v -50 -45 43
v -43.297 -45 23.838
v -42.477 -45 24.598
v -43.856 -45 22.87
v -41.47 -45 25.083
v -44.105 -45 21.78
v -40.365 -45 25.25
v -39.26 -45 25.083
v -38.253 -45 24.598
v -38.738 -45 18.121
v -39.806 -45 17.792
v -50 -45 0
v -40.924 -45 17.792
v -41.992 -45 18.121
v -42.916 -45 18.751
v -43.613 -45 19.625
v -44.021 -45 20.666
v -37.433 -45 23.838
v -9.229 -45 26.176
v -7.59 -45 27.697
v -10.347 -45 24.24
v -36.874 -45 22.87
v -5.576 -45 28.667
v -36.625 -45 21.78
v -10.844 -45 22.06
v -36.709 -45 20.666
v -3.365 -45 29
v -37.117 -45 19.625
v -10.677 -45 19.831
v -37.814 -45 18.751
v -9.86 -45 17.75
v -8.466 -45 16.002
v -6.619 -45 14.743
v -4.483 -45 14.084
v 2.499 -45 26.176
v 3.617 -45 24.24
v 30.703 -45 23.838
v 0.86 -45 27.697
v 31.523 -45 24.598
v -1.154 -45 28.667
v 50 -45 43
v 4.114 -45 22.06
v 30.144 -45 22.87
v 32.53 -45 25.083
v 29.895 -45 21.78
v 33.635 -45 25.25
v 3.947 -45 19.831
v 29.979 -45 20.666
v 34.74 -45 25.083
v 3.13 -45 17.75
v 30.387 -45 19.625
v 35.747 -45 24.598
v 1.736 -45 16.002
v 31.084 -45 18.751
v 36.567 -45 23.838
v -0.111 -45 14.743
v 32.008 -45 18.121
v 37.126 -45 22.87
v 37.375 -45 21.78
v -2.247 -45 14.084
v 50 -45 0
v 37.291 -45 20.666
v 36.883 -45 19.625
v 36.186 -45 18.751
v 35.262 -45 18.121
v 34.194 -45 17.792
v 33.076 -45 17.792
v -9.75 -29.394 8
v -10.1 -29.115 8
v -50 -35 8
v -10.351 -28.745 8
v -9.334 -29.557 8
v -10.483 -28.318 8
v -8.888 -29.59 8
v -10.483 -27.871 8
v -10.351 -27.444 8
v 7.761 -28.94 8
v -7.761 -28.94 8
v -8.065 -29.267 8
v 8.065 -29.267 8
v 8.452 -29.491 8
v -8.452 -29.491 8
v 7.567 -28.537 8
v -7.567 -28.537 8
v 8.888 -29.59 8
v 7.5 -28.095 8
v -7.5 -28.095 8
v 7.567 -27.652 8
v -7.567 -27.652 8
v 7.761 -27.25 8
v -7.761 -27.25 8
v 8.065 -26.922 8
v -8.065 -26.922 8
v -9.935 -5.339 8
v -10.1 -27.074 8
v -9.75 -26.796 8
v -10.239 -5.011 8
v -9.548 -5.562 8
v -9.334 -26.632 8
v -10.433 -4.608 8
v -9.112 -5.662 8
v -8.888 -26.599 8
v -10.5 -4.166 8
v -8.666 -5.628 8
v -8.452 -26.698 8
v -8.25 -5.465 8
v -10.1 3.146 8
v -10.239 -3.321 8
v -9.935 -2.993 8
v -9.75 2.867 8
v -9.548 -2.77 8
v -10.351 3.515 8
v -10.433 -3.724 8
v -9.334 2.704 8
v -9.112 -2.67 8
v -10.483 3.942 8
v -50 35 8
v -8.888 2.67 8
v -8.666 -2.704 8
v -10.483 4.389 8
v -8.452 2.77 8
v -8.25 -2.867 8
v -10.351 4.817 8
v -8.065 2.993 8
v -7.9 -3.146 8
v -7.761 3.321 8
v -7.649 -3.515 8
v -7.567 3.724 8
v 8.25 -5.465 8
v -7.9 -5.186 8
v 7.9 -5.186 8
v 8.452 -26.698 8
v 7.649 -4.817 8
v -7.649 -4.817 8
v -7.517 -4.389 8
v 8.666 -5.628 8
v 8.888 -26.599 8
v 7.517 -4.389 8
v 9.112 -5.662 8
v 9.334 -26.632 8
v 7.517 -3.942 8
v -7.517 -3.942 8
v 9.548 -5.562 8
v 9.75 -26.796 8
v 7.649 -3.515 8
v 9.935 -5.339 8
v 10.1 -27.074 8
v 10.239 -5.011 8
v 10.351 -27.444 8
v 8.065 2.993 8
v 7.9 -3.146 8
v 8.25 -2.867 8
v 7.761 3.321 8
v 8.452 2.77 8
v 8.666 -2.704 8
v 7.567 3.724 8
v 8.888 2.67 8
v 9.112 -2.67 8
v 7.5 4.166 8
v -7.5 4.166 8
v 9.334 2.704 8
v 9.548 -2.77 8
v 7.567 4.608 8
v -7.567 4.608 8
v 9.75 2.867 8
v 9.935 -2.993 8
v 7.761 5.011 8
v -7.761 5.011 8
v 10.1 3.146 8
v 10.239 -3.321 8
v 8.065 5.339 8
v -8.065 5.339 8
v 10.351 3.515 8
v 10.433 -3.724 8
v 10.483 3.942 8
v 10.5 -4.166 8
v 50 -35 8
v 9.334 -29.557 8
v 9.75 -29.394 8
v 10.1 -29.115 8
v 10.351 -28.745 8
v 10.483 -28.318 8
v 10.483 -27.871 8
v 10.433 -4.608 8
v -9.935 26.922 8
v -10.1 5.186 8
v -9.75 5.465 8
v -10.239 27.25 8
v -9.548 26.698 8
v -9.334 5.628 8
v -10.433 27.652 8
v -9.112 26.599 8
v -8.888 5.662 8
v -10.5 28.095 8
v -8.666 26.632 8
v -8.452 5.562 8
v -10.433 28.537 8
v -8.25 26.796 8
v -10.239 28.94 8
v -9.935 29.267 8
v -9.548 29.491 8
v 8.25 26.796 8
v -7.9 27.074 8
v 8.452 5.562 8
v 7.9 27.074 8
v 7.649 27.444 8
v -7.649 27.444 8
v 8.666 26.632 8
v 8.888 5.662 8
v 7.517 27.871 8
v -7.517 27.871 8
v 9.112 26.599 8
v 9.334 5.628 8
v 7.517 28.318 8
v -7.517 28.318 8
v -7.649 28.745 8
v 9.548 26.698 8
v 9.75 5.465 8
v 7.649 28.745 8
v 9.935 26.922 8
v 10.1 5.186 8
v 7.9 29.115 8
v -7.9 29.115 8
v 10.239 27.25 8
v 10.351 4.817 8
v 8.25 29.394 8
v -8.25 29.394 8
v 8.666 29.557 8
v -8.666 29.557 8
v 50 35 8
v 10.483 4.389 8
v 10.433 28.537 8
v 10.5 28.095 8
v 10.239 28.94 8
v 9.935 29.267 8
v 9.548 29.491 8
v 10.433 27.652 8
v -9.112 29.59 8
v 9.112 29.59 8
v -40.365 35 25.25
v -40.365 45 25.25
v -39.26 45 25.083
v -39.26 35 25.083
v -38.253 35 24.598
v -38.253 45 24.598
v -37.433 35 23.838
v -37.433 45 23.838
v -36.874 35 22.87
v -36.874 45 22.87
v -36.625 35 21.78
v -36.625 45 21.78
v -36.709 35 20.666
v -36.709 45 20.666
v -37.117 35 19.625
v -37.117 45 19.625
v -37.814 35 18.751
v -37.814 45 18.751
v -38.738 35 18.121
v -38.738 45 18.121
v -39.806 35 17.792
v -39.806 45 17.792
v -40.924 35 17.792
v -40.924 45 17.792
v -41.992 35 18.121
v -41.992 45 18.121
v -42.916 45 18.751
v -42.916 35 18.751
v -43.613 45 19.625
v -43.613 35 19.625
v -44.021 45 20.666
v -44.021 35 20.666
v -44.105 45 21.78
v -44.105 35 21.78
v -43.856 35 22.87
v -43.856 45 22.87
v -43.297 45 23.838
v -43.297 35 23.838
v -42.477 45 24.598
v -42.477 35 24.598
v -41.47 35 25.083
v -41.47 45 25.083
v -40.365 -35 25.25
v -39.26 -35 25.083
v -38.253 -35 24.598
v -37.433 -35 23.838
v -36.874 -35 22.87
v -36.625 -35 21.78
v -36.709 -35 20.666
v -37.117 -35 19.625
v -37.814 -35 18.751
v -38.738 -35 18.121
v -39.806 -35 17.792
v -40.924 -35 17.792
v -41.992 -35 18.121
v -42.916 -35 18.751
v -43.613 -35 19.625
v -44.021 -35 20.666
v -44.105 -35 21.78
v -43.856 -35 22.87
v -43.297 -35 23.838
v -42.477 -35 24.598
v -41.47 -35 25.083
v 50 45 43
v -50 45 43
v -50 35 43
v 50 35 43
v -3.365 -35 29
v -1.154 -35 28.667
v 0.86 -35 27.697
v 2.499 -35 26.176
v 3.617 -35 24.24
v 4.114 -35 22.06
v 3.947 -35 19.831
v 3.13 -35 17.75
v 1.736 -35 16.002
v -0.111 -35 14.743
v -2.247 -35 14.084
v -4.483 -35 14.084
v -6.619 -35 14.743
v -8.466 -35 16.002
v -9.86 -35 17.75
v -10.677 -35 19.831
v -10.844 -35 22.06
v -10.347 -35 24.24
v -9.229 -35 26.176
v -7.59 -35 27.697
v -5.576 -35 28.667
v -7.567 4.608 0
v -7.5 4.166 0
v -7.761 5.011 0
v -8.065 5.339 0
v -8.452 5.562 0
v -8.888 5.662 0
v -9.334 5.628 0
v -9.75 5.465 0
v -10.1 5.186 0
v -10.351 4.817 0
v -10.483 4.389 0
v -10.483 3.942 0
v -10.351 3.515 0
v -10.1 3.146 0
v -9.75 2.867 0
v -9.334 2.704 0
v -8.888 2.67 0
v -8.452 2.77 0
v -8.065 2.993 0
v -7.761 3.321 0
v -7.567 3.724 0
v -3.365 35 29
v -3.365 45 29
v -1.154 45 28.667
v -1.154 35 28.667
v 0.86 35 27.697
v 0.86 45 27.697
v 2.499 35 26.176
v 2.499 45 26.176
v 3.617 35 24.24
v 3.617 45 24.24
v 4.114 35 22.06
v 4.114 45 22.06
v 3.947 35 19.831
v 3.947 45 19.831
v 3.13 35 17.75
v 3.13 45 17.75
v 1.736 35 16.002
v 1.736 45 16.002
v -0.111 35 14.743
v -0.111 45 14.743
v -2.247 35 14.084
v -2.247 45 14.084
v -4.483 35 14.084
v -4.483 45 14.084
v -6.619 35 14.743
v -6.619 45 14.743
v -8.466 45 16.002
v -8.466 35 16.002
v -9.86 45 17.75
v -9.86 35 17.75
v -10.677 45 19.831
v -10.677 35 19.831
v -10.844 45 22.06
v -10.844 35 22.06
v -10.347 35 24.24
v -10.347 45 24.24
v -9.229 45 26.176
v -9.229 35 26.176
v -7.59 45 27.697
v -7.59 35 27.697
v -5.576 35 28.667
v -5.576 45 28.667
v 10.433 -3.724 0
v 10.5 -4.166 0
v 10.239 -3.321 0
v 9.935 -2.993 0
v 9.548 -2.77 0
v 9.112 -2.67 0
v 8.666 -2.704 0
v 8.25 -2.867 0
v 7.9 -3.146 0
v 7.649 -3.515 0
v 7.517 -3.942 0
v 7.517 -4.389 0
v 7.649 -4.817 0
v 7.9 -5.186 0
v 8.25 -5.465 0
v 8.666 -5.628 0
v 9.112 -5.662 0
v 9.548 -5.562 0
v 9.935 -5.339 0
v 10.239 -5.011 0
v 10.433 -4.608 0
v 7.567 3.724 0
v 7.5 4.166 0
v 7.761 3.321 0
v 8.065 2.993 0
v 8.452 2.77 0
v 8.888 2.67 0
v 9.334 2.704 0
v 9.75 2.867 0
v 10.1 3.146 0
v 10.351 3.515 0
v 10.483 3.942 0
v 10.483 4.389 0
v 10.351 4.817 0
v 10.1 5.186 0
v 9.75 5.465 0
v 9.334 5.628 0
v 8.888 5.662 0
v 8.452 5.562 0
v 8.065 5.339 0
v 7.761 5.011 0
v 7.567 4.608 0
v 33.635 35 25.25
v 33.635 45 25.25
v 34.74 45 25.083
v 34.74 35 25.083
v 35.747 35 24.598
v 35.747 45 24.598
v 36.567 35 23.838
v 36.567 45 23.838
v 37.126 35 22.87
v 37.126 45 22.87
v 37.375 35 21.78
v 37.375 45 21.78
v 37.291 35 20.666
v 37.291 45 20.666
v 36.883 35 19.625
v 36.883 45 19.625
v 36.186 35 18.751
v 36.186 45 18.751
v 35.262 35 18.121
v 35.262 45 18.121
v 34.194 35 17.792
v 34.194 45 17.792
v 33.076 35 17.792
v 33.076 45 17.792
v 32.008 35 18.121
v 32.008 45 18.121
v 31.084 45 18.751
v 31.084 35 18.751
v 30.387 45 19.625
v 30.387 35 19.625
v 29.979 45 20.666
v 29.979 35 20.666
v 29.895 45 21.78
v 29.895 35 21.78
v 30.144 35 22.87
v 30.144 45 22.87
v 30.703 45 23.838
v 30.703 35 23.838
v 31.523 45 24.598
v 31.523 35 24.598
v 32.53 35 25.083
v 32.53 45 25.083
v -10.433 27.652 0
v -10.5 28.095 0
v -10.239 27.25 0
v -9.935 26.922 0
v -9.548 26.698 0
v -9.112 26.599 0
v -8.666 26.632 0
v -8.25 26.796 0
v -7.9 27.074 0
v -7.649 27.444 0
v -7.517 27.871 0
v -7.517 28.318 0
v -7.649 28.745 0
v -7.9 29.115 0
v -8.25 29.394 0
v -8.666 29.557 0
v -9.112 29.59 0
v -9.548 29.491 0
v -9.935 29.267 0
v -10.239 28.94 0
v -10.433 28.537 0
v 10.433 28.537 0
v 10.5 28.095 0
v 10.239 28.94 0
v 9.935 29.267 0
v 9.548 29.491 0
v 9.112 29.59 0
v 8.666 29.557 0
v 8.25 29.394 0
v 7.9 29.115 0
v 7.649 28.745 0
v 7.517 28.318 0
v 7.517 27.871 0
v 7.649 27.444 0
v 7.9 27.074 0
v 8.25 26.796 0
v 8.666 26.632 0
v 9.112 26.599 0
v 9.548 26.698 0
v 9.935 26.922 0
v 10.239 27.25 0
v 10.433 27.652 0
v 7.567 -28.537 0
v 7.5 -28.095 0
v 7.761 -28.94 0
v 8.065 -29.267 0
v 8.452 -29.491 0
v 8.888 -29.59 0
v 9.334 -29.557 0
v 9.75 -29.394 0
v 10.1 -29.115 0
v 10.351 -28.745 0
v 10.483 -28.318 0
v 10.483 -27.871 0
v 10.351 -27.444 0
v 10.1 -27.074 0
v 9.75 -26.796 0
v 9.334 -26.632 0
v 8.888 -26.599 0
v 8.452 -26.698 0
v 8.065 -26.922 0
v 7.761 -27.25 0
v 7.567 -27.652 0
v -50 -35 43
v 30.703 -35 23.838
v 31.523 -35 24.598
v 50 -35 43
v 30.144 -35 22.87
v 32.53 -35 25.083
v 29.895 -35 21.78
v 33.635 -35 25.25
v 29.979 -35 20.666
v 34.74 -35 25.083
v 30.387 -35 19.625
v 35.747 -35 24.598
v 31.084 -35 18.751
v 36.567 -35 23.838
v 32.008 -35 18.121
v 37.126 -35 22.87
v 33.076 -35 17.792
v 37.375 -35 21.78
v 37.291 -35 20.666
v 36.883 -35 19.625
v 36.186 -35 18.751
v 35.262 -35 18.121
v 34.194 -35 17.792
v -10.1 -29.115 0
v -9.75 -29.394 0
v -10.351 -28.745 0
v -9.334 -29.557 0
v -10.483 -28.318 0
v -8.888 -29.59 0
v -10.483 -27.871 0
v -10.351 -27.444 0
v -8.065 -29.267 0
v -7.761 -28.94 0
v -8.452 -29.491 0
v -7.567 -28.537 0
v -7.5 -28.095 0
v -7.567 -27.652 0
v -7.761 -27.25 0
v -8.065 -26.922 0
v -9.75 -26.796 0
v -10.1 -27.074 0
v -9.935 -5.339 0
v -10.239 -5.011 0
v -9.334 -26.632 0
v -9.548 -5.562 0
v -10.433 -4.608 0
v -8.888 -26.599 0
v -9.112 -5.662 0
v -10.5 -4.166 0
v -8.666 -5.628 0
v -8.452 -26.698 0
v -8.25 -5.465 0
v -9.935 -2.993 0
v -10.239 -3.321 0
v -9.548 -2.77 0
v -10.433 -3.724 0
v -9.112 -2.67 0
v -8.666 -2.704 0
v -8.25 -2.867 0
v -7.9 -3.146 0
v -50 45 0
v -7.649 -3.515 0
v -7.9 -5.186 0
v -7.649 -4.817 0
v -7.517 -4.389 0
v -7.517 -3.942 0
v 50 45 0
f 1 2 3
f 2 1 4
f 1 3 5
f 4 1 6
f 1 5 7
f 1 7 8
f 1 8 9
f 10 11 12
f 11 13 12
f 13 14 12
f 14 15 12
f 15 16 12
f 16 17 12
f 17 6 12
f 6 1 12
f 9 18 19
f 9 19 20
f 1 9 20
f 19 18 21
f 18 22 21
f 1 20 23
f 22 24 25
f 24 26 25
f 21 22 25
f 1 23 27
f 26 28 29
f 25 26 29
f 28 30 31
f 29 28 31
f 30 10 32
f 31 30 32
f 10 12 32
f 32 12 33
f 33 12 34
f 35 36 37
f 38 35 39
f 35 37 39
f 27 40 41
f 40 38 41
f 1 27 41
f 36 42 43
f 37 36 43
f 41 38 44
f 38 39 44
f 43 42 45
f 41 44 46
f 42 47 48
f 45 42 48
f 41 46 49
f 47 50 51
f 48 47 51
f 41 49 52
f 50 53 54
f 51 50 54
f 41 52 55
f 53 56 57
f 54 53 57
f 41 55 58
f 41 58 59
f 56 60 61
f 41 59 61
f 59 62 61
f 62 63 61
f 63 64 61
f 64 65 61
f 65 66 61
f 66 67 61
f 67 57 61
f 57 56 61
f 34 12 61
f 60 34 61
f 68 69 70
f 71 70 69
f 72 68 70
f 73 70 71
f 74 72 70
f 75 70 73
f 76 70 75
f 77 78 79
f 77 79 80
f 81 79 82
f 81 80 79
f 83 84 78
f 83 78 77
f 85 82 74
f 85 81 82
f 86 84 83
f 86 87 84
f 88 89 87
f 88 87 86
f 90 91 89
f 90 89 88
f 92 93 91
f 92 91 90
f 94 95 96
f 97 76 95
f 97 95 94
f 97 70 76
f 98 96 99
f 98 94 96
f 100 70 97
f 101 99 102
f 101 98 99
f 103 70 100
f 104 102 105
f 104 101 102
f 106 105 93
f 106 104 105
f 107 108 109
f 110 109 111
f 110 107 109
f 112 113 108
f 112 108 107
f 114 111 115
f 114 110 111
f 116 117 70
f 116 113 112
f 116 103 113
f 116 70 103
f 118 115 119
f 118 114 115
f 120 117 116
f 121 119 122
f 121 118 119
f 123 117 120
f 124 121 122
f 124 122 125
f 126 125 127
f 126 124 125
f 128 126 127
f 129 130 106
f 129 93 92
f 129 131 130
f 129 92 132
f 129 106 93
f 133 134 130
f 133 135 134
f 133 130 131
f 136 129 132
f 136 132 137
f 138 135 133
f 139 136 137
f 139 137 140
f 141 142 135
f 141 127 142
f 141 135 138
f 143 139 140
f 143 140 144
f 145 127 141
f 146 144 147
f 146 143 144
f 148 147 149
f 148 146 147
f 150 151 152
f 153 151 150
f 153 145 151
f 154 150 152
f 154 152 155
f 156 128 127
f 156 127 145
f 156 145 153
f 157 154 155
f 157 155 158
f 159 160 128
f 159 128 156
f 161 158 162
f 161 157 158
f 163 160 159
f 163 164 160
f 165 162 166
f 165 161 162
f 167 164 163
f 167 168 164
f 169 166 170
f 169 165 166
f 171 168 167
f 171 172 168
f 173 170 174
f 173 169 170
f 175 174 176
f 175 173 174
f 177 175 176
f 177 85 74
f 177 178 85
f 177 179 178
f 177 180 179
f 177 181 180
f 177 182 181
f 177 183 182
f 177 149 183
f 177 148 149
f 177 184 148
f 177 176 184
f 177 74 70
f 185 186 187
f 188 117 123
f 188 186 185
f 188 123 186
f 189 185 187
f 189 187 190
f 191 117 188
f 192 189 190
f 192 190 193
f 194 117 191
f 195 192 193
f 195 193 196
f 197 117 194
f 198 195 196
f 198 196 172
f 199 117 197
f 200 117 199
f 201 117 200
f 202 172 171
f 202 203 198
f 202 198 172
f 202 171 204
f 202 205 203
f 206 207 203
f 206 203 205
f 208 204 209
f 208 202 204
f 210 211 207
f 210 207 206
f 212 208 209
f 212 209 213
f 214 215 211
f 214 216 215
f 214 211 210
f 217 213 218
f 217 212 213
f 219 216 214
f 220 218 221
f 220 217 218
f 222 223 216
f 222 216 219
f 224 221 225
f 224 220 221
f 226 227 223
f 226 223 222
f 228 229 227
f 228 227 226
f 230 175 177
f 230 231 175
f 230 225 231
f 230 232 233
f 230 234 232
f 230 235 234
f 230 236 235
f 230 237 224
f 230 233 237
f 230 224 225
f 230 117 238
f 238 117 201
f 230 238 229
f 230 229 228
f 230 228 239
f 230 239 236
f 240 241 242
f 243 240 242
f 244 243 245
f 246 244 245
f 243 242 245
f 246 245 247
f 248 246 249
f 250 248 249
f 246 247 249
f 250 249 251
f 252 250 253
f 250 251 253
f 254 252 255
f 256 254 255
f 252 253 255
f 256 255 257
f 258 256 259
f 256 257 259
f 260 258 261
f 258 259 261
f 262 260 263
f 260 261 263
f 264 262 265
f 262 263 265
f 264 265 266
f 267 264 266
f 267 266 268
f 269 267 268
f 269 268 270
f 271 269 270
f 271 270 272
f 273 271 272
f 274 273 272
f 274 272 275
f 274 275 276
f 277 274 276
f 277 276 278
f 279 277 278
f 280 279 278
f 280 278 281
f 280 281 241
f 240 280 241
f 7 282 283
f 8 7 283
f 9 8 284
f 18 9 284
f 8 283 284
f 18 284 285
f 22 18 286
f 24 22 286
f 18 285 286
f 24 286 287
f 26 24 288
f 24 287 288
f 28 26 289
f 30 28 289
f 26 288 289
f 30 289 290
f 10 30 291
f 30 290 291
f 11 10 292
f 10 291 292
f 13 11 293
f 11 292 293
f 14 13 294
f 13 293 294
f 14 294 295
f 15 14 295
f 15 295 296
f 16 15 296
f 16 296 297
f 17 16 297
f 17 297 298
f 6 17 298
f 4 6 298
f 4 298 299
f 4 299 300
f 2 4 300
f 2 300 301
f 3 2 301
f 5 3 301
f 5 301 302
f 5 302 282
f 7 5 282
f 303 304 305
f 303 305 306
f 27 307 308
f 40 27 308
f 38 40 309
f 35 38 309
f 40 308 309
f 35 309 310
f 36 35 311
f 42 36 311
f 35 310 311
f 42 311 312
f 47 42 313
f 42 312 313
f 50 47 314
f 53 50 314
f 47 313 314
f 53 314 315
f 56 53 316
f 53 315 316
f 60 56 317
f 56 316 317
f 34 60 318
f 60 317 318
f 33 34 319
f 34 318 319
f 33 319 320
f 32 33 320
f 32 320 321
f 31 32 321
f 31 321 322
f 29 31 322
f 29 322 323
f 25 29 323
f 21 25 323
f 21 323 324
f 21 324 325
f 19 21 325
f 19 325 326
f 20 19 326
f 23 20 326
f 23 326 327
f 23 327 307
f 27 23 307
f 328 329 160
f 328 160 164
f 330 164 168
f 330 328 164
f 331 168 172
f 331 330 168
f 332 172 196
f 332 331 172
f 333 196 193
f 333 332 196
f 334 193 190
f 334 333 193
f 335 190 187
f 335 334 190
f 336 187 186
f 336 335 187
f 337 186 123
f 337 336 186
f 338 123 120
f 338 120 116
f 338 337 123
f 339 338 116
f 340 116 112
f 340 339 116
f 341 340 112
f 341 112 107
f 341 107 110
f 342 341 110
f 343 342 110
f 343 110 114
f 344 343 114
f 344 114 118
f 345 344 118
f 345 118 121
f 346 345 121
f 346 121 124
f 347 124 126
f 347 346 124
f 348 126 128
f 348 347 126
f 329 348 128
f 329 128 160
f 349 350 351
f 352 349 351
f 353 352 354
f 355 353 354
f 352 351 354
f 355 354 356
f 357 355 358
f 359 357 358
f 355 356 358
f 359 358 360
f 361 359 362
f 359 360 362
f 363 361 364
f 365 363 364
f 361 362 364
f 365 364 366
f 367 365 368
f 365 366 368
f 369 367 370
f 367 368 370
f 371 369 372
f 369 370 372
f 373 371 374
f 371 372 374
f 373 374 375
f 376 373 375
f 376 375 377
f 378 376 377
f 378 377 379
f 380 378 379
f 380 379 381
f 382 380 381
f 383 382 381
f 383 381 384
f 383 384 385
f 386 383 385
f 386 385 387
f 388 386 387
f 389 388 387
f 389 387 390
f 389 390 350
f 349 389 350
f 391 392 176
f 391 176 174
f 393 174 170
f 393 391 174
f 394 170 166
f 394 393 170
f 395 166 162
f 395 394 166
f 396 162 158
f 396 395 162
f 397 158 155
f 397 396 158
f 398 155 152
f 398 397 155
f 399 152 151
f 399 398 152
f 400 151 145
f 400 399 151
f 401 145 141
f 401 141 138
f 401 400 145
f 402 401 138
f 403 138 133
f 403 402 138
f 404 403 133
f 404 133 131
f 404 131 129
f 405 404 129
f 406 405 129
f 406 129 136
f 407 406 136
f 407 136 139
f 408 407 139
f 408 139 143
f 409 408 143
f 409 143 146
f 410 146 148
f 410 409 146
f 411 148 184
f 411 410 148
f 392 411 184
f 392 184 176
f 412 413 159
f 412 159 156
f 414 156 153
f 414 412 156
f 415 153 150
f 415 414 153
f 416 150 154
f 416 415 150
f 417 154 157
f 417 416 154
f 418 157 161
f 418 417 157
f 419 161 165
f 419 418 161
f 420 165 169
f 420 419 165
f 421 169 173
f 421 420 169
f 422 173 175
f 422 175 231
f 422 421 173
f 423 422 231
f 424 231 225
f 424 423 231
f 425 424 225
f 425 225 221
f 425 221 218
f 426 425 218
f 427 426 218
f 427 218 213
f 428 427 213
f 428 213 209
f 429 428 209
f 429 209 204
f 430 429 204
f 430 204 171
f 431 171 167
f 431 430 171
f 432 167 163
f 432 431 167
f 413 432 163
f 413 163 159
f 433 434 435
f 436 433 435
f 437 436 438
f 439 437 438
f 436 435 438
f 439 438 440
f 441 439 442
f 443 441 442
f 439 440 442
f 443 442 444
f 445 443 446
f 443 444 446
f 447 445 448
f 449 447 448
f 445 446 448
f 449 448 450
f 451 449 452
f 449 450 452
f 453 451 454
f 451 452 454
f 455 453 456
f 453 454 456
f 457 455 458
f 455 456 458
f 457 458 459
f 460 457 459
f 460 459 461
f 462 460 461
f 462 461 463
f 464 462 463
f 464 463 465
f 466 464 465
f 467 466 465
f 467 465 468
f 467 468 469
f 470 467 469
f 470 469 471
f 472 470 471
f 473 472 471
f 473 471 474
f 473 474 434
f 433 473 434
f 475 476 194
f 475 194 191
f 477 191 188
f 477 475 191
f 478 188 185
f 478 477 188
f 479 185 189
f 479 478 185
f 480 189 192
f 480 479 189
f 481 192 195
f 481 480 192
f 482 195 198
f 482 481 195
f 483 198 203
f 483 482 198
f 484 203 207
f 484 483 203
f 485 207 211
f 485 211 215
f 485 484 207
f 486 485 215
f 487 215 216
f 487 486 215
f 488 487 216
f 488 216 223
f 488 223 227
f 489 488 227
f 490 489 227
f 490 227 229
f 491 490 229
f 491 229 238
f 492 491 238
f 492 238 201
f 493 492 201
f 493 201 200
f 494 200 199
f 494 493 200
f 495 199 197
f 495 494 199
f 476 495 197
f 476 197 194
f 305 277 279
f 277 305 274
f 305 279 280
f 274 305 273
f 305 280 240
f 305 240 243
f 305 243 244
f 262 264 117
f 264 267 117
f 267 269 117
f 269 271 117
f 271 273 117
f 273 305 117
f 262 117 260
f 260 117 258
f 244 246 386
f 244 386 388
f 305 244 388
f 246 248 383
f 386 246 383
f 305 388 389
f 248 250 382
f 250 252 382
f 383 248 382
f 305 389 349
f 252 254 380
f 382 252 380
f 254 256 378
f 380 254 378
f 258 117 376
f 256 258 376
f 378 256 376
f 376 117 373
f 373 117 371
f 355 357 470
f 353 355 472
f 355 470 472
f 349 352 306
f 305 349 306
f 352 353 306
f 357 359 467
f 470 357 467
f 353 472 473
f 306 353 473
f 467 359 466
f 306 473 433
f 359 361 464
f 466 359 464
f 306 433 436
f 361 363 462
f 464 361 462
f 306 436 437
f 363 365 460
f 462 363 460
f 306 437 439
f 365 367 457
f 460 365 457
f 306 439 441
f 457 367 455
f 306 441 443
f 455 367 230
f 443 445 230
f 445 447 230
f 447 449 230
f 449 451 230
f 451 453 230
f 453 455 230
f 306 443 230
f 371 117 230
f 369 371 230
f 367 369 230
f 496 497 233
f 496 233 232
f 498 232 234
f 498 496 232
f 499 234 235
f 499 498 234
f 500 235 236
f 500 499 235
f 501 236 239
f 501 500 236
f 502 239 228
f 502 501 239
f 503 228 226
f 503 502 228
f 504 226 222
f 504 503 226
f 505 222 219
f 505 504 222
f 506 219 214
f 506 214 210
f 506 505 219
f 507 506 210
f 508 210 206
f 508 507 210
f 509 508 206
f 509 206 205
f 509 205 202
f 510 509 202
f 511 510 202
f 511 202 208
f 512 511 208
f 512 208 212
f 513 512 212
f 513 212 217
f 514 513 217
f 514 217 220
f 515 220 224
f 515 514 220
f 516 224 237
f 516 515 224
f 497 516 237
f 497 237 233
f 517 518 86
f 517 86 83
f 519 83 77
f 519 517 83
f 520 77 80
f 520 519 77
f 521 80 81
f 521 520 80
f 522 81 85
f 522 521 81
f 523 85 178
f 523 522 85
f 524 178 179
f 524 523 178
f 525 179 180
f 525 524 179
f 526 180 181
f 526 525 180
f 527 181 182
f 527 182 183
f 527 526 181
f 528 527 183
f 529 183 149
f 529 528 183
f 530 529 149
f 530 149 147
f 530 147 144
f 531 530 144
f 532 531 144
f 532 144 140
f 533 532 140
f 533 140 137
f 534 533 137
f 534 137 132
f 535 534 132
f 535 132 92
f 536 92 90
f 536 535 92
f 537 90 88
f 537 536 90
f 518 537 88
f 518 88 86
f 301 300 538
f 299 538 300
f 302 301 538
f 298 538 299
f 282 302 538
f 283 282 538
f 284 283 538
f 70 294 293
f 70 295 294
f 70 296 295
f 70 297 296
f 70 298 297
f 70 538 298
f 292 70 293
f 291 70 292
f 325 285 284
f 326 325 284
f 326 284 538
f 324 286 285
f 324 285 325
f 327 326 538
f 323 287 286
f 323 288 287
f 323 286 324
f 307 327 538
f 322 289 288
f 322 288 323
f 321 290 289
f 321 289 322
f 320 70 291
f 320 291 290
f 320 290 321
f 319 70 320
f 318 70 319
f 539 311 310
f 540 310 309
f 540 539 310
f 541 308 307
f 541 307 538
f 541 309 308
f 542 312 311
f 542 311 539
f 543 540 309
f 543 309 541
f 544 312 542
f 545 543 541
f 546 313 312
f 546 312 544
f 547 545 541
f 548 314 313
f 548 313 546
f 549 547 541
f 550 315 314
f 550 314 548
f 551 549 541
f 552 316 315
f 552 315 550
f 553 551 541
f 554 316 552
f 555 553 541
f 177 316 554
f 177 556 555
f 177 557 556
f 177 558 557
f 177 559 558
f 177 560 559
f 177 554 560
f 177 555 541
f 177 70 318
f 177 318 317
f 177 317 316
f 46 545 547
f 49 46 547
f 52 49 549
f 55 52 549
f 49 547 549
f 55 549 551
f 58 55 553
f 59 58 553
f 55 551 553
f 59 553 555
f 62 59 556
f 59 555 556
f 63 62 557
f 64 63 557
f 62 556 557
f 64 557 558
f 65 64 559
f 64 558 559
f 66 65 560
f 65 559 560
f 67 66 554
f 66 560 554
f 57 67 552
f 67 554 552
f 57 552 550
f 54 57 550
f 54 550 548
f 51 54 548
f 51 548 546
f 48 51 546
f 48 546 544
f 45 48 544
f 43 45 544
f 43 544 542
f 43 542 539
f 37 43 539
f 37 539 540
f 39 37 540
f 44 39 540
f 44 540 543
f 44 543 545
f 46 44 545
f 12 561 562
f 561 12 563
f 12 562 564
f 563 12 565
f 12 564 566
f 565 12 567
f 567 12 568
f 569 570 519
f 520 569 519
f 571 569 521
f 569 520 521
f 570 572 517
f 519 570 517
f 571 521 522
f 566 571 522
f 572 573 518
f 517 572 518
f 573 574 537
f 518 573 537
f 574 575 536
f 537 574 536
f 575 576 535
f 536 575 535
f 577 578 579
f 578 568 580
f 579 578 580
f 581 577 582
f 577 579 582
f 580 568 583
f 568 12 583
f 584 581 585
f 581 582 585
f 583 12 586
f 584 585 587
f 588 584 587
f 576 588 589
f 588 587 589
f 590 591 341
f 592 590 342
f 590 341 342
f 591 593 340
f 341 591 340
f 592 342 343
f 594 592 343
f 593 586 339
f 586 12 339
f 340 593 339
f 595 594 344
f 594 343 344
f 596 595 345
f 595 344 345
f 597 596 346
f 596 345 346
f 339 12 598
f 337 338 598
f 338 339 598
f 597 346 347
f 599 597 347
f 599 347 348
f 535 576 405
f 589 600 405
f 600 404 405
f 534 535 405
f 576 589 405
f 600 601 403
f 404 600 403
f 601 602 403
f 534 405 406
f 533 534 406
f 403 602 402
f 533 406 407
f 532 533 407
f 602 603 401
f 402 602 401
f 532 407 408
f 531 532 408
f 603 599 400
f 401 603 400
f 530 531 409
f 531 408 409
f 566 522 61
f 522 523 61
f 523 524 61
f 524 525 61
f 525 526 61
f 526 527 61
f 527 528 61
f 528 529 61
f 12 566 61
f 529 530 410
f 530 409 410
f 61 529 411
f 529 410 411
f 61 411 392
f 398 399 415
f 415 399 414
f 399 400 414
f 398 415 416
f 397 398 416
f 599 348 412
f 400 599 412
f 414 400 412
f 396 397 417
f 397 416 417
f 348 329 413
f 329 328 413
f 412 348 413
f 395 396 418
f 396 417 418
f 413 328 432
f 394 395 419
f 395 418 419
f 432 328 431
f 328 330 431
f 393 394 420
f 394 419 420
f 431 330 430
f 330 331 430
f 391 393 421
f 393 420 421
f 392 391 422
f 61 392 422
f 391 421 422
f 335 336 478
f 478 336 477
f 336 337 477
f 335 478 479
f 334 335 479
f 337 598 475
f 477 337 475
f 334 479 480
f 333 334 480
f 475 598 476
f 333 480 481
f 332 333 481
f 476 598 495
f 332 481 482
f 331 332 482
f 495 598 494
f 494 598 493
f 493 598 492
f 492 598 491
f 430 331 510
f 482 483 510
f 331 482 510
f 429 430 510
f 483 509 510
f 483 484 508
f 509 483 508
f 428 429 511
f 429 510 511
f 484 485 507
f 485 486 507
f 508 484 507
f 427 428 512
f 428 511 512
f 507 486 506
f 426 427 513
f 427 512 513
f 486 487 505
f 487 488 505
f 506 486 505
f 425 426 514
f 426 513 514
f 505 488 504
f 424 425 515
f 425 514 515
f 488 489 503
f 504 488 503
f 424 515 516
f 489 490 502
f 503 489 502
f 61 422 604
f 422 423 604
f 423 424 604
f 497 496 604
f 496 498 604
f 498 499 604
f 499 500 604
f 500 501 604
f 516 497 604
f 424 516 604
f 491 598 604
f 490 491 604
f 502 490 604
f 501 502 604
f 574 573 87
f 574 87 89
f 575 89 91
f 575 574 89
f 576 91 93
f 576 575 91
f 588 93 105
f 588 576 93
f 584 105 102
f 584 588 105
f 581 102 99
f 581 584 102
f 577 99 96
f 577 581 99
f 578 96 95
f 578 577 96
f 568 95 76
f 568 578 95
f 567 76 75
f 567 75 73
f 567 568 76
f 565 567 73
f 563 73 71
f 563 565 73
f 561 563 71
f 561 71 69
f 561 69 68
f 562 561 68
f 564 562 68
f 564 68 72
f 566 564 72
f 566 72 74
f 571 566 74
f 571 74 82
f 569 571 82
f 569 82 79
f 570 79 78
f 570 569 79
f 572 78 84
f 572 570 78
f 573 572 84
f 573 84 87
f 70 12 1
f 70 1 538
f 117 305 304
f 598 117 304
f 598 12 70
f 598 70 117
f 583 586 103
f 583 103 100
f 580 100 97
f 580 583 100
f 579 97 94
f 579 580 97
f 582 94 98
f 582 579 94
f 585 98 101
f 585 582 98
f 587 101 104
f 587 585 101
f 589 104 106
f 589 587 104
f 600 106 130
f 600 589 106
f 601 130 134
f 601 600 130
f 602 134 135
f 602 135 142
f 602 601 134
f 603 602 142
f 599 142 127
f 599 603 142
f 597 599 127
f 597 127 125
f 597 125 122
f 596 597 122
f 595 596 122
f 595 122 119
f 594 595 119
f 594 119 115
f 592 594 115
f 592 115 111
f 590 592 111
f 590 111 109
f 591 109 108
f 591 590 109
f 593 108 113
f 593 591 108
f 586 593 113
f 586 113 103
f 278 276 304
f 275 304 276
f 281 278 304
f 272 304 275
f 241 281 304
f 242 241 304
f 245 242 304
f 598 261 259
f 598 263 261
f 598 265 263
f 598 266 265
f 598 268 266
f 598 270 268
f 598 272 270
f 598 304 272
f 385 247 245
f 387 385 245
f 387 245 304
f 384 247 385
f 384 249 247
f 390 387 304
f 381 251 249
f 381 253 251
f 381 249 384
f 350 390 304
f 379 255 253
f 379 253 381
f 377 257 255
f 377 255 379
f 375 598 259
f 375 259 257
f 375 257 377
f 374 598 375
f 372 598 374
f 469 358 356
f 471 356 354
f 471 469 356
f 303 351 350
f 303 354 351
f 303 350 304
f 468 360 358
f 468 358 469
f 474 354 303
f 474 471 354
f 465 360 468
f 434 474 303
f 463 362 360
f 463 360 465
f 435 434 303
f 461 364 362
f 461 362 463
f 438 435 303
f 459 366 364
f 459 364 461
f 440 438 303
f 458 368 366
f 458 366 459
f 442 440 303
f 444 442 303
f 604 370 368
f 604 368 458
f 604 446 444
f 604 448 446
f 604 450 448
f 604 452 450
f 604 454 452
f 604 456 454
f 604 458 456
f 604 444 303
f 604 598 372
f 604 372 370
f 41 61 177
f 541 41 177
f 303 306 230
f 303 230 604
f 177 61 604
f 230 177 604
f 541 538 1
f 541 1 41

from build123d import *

# Parameters (mm, degrees)
SKETCH2_W           = 100
SKETCH2_H           = 90
SKETCH2_R           = 1.5
BOSS_EXTRUDE1_DEPTH = 8
SKETCH5_W           = 100
SKETCH5_H           = 10
BOSS_EXTRUDE2_DEPTH = 35
SKETCH7_R           = 7.5
SKETCH7_R_2         = 3.75
CUT_EXTRUDE2_DEPTH  = 290


with BuildPart() as part:
    # Sketch2 → Boss-Extrude1 (new body)
    with BuildSketch(Plane.XY):
        Rectangle(SKETCH2_W, SKETCH2_H)
        with Locations(Location((-9, -4.165902831, 0), (0, 0, 180))):
            Circle(SKETCH2_R, mode=Mode.SUBTRACT)
        with Locations(Location((9, -28.094631071, 0), (0, 0, 180))):
            Circle(SKETCH2_R, mode=Mode.SUBTRACT)
        with Locations((9, -4.165902831)):
            Circle(SKETCH2_R, mode=Mode.SUBTRACT)
        with Locations((-9, -28.094631071)):
            Circle(SKETCH2_R, mode=Mode.SUBTRACT)
        with Locations(Location((-9, 28.094631071, 0), (0, 0, 180))):
            Circle(SKETCH2_R, mode=Mode.SUBTRACT)
        with Locations((9, 28.094631071)):
            Circle(SKETCH2_R, mode=Mode.SUBTRACT)
        with Locations(Location((9, 4.165902831, 0), (0, 0, 180))):
            Circle(SKETCH2_R, mode=Mode.SUBTRACT)
        with Locations((-9, 4.165902831)):
            Circle(SKETCH2_R, mode=Mode.SUBTRACT)
    extrude(amount=BOSS_EXTRUDE1_DEPTH)

    # Sketch5 → Boss-Extrude2 (add)
    with BuildSketch(Plane.XY.offset(8)):
        with Locations((0, 40)):
            Rectangle(SKETCH5_W, SKETCH5_H)
        with Locations((0, -40)):
            Rectangle(SKETCH5_W, SKETCH5_H)
    extrude(amount=BOSS_EXTRUDE2_DEPTH)

    # Sketch7 → Cut-Extrude2 (cut)
    with BuildSketch(Plane(origin=(0, 45, 0), x_dir=(1, 0, 0), z_dir=(0, 1, 0))):
        with Locations(Location((-3.365, -21.5, 0), (0, 0, 270))):
            Circle(SKETCH7_R)
        with Locations(Location((-40.365, -21.5, 0), (0, 0, 270))):
            Circle(SKETCH7_R_2)
        with Locations(Location((33.635, -21.5, 0), (0, 0, 270))):
            Circle(SKETCH7_R_2)
    extrude(amount=-CUT_EXTRUDE2_DEPTH, mode=Mode.SUBTRACT)


solid = part.part
